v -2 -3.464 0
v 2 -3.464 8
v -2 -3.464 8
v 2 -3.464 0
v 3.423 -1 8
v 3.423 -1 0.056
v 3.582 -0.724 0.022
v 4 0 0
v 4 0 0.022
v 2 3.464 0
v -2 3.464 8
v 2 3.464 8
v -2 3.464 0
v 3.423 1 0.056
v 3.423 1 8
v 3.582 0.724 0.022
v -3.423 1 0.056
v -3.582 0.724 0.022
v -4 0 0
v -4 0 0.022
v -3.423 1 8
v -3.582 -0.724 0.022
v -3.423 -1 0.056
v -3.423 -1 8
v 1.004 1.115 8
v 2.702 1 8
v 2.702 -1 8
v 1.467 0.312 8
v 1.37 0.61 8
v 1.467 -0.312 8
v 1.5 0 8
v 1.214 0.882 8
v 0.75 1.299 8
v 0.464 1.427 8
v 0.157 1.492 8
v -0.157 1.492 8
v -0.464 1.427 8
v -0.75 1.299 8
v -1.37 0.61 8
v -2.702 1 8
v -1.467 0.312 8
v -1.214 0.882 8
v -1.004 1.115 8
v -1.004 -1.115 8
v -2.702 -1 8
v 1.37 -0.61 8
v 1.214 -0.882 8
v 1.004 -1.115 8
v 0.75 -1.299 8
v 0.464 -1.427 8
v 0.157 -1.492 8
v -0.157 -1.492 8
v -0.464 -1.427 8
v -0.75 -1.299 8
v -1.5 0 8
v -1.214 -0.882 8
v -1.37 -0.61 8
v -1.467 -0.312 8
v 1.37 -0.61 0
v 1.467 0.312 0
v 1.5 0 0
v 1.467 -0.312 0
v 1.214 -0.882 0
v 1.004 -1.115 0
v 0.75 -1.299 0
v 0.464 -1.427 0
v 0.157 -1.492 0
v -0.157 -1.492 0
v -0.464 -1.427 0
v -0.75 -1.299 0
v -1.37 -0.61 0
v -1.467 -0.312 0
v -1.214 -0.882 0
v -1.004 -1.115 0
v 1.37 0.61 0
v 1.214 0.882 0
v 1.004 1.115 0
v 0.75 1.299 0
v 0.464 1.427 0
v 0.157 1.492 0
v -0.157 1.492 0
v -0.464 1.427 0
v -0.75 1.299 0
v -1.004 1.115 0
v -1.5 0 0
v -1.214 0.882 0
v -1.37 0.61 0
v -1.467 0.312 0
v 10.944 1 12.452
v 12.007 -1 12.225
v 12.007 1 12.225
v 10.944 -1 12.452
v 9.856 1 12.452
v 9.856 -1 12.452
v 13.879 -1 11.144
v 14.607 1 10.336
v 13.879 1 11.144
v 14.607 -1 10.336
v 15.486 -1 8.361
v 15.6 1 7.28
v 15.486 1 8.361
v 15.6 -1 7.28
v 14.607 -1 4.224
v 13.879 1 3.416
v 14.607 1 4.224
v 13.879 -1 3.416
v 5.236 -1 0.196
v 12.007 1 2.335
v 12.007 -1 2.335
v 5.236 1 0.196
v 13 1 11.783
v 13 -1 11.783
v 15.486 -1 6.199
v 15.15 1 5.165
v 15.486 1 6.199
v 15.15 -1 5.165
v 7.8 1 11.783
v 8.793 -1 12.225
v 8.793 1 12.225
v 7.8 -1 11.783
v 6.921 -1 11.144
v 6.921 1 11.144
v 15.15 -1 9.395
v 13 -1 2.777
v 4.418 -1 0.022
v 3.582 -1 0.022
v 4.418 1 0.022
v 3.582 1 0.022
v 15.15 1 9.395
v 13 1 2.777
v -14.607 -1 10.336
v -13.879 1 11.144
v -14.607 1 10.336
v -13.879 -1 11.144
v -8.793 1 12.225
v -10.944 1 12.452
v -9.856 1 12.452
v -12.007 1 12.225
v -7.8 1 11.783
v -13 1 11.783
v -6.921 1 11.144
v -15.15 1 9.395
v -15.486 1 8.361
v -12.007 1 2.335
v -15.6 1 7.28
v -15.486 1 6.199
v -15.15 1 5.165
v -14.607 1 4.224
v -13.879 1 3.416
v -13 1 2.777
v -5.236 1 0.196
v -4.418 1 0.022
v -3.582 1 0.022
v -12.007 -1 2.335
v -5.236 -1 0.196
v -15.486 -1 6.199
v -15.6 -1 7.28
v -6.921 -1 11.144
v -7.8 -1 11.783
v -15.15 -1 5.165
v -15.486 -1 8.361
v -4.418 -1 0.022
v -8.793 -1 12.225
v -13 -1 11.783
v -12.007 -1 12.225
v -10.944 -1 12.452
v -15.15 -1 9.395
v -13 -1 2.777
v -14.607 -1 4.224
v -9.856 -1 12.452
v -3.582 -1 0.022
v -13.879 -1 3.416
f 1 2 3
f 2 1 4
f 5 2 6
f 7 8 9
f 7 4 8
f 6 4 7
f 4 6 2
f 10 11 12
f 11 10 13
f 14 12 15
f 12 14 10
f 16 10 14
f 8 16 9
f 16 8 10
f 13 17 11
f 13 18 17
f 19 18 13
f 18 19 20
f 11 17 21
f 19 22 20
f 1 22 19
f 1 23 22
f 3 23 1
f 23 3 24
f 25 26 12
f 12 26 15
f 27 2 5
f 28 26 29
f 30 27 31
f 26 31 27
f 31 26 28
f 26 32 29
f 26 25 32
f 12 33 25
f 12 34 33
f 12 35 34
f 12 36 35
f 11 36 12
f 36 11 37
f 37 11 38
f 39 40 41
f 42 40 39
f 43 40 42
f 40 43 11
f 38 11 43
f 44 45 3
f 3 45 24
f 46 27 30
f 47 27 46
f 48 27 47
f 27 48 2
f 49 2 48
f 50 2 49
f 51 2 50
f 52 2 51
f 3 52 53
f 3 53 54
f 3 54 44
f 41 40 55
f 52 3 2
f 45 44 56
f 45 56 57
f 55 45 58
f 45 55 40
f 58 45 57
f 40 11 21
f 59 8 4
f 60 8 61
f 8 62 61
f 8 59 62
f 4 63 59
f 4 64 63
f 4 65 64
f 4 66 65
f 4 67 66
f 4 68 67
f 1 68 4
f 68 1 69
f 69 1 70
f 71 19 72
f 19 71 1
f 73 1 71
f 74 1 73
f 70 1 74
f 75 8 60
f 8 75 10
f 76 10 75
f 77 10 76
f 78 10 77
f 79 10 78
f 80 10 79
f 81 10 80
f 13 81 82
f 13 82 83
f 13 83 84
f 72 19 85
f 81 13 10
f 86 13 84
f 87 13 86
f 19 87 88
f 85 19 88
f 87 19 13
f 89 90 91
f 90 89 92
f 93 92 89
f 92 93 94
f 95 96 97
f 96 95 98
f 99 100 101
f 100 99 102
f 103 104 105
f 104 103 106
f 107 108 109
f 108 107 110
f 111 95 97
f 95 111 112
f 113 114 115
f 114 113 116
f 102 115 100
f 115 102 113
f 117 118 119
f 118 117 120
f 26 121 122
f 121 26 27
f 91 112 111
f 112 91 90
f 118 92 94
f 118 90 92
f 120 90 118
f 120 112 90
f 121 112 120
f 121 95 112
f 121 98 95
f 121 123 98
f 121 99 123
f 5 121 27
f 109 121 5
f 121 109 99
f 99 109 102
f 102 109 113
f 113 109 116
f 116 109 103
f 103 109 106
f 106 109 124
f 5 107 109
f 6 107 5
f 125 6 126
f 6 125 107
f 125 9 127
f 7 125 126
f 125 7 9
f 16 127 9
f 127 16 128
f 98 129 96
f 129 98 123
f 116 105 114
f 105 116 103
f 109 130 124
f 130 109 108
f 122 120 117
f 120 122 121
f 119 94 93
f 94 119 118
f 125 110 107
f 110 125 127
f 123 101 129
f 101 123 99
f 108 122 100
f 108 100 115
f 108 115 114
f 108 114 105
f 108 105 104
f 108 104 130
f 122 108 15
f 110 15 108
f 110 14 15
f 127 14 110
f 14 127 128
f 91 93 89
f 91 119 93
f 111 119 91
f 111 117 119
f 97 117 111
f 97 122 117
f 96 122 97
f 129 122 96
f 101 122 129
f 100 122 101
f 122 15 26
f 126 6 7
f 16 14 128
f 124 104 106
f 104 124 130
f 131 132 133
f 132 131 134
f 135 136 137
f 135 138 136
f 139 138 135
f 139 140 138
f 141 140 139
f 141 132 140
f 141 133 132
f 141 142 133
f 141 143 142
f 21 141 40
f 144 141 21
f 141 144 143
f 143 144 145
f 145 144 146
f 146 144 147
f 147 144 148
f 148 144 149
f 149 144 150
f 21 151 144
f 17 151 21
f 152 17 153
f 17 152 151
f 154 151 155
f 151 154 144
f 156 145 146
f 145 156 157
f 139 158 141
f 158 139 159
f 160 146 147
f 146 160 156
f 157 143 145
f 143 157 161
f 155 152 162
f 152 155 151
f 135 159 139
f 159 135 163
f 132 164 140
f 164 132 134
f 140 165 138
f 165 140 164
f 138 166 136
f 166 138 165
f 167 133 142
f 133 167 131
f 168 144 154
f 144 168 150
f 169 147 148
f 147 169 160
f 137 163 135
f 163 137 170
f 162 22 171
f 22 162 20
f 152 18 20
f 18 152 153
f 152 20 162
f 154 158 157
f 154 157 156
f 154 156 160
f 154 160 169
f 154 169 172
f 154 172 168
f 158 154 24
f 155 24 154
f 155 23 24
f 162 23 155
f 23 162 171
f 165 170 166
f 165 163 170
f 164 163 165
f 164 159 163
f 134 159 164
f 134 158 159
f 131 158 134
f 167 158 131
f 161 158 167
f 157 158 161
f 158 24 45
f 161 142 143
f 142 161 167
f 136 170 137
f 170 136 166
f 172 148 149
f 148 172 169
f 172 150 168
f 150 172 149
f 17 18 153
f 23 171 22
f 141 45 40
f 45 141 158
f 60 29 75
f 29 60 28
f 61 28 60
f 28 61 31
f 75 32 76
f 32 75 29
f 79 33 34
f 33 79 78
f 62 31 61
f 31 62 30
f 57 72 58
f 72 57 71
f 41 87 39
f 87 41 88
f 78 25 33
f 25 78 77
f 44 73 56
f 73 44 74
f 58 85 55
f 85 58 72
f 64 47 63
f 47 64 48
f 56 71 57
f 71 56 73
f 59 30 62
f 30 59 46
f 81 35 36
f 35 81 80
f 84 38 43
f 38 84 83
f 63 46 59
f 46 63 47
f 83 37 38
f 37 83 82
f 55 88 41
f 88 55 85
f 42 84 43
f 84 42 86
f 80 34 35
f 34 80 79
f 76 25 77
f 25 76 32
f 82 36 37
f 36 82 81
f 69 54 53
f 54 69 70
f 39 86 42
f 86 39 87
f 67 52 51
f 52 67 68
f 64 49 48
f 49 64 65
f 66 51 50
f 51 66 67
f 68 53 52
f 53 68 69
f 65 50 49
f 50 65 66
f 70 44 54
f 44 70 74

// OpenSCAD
//
//  parametric wing nut
//  


major = 4.0; // [ 2.0, 2.5, 3.0, 4.0, 5.0, 6.0, 8.0, 10.0, 12.0 ]
minor = major*0.75; // 2.25 for M3, 3.0 for M4, 3.9 for M5, 4.6 for M6, 6.25 for 

have_wings = true; // [ true, false ]

d = 1*0.01;

nutheight = 2*major;
wingmaxr = major*1.3;
wingwall = major*0.5;

module wing() {
	if (have_wings) hull () {
		translate([nutheight/2,0,major]) rotate([90,0,0]) 
			translate([0,0,-wingwall/2]) cylinder(r = nutheight/2, h = wingwall, $fn=30);
		translate([wingmaxr*2.0,0,wingmaxr*1.4]) rotate([90,0,0]) 
			translate([0,0,-wingwall/2]) cylinder(r = wingmaxr, h = wingwall, $fn=30);
	}
}

difference () {
	union () {
		cylinder(r = major, h = nutheight, $fn=6);
		wing();
		rotate([0, 0, 180]) wing();
	}
	translate([0, 0, -d]) cylinder(r = minor/2, h = nutheight+2*d, $fn=30);
}

